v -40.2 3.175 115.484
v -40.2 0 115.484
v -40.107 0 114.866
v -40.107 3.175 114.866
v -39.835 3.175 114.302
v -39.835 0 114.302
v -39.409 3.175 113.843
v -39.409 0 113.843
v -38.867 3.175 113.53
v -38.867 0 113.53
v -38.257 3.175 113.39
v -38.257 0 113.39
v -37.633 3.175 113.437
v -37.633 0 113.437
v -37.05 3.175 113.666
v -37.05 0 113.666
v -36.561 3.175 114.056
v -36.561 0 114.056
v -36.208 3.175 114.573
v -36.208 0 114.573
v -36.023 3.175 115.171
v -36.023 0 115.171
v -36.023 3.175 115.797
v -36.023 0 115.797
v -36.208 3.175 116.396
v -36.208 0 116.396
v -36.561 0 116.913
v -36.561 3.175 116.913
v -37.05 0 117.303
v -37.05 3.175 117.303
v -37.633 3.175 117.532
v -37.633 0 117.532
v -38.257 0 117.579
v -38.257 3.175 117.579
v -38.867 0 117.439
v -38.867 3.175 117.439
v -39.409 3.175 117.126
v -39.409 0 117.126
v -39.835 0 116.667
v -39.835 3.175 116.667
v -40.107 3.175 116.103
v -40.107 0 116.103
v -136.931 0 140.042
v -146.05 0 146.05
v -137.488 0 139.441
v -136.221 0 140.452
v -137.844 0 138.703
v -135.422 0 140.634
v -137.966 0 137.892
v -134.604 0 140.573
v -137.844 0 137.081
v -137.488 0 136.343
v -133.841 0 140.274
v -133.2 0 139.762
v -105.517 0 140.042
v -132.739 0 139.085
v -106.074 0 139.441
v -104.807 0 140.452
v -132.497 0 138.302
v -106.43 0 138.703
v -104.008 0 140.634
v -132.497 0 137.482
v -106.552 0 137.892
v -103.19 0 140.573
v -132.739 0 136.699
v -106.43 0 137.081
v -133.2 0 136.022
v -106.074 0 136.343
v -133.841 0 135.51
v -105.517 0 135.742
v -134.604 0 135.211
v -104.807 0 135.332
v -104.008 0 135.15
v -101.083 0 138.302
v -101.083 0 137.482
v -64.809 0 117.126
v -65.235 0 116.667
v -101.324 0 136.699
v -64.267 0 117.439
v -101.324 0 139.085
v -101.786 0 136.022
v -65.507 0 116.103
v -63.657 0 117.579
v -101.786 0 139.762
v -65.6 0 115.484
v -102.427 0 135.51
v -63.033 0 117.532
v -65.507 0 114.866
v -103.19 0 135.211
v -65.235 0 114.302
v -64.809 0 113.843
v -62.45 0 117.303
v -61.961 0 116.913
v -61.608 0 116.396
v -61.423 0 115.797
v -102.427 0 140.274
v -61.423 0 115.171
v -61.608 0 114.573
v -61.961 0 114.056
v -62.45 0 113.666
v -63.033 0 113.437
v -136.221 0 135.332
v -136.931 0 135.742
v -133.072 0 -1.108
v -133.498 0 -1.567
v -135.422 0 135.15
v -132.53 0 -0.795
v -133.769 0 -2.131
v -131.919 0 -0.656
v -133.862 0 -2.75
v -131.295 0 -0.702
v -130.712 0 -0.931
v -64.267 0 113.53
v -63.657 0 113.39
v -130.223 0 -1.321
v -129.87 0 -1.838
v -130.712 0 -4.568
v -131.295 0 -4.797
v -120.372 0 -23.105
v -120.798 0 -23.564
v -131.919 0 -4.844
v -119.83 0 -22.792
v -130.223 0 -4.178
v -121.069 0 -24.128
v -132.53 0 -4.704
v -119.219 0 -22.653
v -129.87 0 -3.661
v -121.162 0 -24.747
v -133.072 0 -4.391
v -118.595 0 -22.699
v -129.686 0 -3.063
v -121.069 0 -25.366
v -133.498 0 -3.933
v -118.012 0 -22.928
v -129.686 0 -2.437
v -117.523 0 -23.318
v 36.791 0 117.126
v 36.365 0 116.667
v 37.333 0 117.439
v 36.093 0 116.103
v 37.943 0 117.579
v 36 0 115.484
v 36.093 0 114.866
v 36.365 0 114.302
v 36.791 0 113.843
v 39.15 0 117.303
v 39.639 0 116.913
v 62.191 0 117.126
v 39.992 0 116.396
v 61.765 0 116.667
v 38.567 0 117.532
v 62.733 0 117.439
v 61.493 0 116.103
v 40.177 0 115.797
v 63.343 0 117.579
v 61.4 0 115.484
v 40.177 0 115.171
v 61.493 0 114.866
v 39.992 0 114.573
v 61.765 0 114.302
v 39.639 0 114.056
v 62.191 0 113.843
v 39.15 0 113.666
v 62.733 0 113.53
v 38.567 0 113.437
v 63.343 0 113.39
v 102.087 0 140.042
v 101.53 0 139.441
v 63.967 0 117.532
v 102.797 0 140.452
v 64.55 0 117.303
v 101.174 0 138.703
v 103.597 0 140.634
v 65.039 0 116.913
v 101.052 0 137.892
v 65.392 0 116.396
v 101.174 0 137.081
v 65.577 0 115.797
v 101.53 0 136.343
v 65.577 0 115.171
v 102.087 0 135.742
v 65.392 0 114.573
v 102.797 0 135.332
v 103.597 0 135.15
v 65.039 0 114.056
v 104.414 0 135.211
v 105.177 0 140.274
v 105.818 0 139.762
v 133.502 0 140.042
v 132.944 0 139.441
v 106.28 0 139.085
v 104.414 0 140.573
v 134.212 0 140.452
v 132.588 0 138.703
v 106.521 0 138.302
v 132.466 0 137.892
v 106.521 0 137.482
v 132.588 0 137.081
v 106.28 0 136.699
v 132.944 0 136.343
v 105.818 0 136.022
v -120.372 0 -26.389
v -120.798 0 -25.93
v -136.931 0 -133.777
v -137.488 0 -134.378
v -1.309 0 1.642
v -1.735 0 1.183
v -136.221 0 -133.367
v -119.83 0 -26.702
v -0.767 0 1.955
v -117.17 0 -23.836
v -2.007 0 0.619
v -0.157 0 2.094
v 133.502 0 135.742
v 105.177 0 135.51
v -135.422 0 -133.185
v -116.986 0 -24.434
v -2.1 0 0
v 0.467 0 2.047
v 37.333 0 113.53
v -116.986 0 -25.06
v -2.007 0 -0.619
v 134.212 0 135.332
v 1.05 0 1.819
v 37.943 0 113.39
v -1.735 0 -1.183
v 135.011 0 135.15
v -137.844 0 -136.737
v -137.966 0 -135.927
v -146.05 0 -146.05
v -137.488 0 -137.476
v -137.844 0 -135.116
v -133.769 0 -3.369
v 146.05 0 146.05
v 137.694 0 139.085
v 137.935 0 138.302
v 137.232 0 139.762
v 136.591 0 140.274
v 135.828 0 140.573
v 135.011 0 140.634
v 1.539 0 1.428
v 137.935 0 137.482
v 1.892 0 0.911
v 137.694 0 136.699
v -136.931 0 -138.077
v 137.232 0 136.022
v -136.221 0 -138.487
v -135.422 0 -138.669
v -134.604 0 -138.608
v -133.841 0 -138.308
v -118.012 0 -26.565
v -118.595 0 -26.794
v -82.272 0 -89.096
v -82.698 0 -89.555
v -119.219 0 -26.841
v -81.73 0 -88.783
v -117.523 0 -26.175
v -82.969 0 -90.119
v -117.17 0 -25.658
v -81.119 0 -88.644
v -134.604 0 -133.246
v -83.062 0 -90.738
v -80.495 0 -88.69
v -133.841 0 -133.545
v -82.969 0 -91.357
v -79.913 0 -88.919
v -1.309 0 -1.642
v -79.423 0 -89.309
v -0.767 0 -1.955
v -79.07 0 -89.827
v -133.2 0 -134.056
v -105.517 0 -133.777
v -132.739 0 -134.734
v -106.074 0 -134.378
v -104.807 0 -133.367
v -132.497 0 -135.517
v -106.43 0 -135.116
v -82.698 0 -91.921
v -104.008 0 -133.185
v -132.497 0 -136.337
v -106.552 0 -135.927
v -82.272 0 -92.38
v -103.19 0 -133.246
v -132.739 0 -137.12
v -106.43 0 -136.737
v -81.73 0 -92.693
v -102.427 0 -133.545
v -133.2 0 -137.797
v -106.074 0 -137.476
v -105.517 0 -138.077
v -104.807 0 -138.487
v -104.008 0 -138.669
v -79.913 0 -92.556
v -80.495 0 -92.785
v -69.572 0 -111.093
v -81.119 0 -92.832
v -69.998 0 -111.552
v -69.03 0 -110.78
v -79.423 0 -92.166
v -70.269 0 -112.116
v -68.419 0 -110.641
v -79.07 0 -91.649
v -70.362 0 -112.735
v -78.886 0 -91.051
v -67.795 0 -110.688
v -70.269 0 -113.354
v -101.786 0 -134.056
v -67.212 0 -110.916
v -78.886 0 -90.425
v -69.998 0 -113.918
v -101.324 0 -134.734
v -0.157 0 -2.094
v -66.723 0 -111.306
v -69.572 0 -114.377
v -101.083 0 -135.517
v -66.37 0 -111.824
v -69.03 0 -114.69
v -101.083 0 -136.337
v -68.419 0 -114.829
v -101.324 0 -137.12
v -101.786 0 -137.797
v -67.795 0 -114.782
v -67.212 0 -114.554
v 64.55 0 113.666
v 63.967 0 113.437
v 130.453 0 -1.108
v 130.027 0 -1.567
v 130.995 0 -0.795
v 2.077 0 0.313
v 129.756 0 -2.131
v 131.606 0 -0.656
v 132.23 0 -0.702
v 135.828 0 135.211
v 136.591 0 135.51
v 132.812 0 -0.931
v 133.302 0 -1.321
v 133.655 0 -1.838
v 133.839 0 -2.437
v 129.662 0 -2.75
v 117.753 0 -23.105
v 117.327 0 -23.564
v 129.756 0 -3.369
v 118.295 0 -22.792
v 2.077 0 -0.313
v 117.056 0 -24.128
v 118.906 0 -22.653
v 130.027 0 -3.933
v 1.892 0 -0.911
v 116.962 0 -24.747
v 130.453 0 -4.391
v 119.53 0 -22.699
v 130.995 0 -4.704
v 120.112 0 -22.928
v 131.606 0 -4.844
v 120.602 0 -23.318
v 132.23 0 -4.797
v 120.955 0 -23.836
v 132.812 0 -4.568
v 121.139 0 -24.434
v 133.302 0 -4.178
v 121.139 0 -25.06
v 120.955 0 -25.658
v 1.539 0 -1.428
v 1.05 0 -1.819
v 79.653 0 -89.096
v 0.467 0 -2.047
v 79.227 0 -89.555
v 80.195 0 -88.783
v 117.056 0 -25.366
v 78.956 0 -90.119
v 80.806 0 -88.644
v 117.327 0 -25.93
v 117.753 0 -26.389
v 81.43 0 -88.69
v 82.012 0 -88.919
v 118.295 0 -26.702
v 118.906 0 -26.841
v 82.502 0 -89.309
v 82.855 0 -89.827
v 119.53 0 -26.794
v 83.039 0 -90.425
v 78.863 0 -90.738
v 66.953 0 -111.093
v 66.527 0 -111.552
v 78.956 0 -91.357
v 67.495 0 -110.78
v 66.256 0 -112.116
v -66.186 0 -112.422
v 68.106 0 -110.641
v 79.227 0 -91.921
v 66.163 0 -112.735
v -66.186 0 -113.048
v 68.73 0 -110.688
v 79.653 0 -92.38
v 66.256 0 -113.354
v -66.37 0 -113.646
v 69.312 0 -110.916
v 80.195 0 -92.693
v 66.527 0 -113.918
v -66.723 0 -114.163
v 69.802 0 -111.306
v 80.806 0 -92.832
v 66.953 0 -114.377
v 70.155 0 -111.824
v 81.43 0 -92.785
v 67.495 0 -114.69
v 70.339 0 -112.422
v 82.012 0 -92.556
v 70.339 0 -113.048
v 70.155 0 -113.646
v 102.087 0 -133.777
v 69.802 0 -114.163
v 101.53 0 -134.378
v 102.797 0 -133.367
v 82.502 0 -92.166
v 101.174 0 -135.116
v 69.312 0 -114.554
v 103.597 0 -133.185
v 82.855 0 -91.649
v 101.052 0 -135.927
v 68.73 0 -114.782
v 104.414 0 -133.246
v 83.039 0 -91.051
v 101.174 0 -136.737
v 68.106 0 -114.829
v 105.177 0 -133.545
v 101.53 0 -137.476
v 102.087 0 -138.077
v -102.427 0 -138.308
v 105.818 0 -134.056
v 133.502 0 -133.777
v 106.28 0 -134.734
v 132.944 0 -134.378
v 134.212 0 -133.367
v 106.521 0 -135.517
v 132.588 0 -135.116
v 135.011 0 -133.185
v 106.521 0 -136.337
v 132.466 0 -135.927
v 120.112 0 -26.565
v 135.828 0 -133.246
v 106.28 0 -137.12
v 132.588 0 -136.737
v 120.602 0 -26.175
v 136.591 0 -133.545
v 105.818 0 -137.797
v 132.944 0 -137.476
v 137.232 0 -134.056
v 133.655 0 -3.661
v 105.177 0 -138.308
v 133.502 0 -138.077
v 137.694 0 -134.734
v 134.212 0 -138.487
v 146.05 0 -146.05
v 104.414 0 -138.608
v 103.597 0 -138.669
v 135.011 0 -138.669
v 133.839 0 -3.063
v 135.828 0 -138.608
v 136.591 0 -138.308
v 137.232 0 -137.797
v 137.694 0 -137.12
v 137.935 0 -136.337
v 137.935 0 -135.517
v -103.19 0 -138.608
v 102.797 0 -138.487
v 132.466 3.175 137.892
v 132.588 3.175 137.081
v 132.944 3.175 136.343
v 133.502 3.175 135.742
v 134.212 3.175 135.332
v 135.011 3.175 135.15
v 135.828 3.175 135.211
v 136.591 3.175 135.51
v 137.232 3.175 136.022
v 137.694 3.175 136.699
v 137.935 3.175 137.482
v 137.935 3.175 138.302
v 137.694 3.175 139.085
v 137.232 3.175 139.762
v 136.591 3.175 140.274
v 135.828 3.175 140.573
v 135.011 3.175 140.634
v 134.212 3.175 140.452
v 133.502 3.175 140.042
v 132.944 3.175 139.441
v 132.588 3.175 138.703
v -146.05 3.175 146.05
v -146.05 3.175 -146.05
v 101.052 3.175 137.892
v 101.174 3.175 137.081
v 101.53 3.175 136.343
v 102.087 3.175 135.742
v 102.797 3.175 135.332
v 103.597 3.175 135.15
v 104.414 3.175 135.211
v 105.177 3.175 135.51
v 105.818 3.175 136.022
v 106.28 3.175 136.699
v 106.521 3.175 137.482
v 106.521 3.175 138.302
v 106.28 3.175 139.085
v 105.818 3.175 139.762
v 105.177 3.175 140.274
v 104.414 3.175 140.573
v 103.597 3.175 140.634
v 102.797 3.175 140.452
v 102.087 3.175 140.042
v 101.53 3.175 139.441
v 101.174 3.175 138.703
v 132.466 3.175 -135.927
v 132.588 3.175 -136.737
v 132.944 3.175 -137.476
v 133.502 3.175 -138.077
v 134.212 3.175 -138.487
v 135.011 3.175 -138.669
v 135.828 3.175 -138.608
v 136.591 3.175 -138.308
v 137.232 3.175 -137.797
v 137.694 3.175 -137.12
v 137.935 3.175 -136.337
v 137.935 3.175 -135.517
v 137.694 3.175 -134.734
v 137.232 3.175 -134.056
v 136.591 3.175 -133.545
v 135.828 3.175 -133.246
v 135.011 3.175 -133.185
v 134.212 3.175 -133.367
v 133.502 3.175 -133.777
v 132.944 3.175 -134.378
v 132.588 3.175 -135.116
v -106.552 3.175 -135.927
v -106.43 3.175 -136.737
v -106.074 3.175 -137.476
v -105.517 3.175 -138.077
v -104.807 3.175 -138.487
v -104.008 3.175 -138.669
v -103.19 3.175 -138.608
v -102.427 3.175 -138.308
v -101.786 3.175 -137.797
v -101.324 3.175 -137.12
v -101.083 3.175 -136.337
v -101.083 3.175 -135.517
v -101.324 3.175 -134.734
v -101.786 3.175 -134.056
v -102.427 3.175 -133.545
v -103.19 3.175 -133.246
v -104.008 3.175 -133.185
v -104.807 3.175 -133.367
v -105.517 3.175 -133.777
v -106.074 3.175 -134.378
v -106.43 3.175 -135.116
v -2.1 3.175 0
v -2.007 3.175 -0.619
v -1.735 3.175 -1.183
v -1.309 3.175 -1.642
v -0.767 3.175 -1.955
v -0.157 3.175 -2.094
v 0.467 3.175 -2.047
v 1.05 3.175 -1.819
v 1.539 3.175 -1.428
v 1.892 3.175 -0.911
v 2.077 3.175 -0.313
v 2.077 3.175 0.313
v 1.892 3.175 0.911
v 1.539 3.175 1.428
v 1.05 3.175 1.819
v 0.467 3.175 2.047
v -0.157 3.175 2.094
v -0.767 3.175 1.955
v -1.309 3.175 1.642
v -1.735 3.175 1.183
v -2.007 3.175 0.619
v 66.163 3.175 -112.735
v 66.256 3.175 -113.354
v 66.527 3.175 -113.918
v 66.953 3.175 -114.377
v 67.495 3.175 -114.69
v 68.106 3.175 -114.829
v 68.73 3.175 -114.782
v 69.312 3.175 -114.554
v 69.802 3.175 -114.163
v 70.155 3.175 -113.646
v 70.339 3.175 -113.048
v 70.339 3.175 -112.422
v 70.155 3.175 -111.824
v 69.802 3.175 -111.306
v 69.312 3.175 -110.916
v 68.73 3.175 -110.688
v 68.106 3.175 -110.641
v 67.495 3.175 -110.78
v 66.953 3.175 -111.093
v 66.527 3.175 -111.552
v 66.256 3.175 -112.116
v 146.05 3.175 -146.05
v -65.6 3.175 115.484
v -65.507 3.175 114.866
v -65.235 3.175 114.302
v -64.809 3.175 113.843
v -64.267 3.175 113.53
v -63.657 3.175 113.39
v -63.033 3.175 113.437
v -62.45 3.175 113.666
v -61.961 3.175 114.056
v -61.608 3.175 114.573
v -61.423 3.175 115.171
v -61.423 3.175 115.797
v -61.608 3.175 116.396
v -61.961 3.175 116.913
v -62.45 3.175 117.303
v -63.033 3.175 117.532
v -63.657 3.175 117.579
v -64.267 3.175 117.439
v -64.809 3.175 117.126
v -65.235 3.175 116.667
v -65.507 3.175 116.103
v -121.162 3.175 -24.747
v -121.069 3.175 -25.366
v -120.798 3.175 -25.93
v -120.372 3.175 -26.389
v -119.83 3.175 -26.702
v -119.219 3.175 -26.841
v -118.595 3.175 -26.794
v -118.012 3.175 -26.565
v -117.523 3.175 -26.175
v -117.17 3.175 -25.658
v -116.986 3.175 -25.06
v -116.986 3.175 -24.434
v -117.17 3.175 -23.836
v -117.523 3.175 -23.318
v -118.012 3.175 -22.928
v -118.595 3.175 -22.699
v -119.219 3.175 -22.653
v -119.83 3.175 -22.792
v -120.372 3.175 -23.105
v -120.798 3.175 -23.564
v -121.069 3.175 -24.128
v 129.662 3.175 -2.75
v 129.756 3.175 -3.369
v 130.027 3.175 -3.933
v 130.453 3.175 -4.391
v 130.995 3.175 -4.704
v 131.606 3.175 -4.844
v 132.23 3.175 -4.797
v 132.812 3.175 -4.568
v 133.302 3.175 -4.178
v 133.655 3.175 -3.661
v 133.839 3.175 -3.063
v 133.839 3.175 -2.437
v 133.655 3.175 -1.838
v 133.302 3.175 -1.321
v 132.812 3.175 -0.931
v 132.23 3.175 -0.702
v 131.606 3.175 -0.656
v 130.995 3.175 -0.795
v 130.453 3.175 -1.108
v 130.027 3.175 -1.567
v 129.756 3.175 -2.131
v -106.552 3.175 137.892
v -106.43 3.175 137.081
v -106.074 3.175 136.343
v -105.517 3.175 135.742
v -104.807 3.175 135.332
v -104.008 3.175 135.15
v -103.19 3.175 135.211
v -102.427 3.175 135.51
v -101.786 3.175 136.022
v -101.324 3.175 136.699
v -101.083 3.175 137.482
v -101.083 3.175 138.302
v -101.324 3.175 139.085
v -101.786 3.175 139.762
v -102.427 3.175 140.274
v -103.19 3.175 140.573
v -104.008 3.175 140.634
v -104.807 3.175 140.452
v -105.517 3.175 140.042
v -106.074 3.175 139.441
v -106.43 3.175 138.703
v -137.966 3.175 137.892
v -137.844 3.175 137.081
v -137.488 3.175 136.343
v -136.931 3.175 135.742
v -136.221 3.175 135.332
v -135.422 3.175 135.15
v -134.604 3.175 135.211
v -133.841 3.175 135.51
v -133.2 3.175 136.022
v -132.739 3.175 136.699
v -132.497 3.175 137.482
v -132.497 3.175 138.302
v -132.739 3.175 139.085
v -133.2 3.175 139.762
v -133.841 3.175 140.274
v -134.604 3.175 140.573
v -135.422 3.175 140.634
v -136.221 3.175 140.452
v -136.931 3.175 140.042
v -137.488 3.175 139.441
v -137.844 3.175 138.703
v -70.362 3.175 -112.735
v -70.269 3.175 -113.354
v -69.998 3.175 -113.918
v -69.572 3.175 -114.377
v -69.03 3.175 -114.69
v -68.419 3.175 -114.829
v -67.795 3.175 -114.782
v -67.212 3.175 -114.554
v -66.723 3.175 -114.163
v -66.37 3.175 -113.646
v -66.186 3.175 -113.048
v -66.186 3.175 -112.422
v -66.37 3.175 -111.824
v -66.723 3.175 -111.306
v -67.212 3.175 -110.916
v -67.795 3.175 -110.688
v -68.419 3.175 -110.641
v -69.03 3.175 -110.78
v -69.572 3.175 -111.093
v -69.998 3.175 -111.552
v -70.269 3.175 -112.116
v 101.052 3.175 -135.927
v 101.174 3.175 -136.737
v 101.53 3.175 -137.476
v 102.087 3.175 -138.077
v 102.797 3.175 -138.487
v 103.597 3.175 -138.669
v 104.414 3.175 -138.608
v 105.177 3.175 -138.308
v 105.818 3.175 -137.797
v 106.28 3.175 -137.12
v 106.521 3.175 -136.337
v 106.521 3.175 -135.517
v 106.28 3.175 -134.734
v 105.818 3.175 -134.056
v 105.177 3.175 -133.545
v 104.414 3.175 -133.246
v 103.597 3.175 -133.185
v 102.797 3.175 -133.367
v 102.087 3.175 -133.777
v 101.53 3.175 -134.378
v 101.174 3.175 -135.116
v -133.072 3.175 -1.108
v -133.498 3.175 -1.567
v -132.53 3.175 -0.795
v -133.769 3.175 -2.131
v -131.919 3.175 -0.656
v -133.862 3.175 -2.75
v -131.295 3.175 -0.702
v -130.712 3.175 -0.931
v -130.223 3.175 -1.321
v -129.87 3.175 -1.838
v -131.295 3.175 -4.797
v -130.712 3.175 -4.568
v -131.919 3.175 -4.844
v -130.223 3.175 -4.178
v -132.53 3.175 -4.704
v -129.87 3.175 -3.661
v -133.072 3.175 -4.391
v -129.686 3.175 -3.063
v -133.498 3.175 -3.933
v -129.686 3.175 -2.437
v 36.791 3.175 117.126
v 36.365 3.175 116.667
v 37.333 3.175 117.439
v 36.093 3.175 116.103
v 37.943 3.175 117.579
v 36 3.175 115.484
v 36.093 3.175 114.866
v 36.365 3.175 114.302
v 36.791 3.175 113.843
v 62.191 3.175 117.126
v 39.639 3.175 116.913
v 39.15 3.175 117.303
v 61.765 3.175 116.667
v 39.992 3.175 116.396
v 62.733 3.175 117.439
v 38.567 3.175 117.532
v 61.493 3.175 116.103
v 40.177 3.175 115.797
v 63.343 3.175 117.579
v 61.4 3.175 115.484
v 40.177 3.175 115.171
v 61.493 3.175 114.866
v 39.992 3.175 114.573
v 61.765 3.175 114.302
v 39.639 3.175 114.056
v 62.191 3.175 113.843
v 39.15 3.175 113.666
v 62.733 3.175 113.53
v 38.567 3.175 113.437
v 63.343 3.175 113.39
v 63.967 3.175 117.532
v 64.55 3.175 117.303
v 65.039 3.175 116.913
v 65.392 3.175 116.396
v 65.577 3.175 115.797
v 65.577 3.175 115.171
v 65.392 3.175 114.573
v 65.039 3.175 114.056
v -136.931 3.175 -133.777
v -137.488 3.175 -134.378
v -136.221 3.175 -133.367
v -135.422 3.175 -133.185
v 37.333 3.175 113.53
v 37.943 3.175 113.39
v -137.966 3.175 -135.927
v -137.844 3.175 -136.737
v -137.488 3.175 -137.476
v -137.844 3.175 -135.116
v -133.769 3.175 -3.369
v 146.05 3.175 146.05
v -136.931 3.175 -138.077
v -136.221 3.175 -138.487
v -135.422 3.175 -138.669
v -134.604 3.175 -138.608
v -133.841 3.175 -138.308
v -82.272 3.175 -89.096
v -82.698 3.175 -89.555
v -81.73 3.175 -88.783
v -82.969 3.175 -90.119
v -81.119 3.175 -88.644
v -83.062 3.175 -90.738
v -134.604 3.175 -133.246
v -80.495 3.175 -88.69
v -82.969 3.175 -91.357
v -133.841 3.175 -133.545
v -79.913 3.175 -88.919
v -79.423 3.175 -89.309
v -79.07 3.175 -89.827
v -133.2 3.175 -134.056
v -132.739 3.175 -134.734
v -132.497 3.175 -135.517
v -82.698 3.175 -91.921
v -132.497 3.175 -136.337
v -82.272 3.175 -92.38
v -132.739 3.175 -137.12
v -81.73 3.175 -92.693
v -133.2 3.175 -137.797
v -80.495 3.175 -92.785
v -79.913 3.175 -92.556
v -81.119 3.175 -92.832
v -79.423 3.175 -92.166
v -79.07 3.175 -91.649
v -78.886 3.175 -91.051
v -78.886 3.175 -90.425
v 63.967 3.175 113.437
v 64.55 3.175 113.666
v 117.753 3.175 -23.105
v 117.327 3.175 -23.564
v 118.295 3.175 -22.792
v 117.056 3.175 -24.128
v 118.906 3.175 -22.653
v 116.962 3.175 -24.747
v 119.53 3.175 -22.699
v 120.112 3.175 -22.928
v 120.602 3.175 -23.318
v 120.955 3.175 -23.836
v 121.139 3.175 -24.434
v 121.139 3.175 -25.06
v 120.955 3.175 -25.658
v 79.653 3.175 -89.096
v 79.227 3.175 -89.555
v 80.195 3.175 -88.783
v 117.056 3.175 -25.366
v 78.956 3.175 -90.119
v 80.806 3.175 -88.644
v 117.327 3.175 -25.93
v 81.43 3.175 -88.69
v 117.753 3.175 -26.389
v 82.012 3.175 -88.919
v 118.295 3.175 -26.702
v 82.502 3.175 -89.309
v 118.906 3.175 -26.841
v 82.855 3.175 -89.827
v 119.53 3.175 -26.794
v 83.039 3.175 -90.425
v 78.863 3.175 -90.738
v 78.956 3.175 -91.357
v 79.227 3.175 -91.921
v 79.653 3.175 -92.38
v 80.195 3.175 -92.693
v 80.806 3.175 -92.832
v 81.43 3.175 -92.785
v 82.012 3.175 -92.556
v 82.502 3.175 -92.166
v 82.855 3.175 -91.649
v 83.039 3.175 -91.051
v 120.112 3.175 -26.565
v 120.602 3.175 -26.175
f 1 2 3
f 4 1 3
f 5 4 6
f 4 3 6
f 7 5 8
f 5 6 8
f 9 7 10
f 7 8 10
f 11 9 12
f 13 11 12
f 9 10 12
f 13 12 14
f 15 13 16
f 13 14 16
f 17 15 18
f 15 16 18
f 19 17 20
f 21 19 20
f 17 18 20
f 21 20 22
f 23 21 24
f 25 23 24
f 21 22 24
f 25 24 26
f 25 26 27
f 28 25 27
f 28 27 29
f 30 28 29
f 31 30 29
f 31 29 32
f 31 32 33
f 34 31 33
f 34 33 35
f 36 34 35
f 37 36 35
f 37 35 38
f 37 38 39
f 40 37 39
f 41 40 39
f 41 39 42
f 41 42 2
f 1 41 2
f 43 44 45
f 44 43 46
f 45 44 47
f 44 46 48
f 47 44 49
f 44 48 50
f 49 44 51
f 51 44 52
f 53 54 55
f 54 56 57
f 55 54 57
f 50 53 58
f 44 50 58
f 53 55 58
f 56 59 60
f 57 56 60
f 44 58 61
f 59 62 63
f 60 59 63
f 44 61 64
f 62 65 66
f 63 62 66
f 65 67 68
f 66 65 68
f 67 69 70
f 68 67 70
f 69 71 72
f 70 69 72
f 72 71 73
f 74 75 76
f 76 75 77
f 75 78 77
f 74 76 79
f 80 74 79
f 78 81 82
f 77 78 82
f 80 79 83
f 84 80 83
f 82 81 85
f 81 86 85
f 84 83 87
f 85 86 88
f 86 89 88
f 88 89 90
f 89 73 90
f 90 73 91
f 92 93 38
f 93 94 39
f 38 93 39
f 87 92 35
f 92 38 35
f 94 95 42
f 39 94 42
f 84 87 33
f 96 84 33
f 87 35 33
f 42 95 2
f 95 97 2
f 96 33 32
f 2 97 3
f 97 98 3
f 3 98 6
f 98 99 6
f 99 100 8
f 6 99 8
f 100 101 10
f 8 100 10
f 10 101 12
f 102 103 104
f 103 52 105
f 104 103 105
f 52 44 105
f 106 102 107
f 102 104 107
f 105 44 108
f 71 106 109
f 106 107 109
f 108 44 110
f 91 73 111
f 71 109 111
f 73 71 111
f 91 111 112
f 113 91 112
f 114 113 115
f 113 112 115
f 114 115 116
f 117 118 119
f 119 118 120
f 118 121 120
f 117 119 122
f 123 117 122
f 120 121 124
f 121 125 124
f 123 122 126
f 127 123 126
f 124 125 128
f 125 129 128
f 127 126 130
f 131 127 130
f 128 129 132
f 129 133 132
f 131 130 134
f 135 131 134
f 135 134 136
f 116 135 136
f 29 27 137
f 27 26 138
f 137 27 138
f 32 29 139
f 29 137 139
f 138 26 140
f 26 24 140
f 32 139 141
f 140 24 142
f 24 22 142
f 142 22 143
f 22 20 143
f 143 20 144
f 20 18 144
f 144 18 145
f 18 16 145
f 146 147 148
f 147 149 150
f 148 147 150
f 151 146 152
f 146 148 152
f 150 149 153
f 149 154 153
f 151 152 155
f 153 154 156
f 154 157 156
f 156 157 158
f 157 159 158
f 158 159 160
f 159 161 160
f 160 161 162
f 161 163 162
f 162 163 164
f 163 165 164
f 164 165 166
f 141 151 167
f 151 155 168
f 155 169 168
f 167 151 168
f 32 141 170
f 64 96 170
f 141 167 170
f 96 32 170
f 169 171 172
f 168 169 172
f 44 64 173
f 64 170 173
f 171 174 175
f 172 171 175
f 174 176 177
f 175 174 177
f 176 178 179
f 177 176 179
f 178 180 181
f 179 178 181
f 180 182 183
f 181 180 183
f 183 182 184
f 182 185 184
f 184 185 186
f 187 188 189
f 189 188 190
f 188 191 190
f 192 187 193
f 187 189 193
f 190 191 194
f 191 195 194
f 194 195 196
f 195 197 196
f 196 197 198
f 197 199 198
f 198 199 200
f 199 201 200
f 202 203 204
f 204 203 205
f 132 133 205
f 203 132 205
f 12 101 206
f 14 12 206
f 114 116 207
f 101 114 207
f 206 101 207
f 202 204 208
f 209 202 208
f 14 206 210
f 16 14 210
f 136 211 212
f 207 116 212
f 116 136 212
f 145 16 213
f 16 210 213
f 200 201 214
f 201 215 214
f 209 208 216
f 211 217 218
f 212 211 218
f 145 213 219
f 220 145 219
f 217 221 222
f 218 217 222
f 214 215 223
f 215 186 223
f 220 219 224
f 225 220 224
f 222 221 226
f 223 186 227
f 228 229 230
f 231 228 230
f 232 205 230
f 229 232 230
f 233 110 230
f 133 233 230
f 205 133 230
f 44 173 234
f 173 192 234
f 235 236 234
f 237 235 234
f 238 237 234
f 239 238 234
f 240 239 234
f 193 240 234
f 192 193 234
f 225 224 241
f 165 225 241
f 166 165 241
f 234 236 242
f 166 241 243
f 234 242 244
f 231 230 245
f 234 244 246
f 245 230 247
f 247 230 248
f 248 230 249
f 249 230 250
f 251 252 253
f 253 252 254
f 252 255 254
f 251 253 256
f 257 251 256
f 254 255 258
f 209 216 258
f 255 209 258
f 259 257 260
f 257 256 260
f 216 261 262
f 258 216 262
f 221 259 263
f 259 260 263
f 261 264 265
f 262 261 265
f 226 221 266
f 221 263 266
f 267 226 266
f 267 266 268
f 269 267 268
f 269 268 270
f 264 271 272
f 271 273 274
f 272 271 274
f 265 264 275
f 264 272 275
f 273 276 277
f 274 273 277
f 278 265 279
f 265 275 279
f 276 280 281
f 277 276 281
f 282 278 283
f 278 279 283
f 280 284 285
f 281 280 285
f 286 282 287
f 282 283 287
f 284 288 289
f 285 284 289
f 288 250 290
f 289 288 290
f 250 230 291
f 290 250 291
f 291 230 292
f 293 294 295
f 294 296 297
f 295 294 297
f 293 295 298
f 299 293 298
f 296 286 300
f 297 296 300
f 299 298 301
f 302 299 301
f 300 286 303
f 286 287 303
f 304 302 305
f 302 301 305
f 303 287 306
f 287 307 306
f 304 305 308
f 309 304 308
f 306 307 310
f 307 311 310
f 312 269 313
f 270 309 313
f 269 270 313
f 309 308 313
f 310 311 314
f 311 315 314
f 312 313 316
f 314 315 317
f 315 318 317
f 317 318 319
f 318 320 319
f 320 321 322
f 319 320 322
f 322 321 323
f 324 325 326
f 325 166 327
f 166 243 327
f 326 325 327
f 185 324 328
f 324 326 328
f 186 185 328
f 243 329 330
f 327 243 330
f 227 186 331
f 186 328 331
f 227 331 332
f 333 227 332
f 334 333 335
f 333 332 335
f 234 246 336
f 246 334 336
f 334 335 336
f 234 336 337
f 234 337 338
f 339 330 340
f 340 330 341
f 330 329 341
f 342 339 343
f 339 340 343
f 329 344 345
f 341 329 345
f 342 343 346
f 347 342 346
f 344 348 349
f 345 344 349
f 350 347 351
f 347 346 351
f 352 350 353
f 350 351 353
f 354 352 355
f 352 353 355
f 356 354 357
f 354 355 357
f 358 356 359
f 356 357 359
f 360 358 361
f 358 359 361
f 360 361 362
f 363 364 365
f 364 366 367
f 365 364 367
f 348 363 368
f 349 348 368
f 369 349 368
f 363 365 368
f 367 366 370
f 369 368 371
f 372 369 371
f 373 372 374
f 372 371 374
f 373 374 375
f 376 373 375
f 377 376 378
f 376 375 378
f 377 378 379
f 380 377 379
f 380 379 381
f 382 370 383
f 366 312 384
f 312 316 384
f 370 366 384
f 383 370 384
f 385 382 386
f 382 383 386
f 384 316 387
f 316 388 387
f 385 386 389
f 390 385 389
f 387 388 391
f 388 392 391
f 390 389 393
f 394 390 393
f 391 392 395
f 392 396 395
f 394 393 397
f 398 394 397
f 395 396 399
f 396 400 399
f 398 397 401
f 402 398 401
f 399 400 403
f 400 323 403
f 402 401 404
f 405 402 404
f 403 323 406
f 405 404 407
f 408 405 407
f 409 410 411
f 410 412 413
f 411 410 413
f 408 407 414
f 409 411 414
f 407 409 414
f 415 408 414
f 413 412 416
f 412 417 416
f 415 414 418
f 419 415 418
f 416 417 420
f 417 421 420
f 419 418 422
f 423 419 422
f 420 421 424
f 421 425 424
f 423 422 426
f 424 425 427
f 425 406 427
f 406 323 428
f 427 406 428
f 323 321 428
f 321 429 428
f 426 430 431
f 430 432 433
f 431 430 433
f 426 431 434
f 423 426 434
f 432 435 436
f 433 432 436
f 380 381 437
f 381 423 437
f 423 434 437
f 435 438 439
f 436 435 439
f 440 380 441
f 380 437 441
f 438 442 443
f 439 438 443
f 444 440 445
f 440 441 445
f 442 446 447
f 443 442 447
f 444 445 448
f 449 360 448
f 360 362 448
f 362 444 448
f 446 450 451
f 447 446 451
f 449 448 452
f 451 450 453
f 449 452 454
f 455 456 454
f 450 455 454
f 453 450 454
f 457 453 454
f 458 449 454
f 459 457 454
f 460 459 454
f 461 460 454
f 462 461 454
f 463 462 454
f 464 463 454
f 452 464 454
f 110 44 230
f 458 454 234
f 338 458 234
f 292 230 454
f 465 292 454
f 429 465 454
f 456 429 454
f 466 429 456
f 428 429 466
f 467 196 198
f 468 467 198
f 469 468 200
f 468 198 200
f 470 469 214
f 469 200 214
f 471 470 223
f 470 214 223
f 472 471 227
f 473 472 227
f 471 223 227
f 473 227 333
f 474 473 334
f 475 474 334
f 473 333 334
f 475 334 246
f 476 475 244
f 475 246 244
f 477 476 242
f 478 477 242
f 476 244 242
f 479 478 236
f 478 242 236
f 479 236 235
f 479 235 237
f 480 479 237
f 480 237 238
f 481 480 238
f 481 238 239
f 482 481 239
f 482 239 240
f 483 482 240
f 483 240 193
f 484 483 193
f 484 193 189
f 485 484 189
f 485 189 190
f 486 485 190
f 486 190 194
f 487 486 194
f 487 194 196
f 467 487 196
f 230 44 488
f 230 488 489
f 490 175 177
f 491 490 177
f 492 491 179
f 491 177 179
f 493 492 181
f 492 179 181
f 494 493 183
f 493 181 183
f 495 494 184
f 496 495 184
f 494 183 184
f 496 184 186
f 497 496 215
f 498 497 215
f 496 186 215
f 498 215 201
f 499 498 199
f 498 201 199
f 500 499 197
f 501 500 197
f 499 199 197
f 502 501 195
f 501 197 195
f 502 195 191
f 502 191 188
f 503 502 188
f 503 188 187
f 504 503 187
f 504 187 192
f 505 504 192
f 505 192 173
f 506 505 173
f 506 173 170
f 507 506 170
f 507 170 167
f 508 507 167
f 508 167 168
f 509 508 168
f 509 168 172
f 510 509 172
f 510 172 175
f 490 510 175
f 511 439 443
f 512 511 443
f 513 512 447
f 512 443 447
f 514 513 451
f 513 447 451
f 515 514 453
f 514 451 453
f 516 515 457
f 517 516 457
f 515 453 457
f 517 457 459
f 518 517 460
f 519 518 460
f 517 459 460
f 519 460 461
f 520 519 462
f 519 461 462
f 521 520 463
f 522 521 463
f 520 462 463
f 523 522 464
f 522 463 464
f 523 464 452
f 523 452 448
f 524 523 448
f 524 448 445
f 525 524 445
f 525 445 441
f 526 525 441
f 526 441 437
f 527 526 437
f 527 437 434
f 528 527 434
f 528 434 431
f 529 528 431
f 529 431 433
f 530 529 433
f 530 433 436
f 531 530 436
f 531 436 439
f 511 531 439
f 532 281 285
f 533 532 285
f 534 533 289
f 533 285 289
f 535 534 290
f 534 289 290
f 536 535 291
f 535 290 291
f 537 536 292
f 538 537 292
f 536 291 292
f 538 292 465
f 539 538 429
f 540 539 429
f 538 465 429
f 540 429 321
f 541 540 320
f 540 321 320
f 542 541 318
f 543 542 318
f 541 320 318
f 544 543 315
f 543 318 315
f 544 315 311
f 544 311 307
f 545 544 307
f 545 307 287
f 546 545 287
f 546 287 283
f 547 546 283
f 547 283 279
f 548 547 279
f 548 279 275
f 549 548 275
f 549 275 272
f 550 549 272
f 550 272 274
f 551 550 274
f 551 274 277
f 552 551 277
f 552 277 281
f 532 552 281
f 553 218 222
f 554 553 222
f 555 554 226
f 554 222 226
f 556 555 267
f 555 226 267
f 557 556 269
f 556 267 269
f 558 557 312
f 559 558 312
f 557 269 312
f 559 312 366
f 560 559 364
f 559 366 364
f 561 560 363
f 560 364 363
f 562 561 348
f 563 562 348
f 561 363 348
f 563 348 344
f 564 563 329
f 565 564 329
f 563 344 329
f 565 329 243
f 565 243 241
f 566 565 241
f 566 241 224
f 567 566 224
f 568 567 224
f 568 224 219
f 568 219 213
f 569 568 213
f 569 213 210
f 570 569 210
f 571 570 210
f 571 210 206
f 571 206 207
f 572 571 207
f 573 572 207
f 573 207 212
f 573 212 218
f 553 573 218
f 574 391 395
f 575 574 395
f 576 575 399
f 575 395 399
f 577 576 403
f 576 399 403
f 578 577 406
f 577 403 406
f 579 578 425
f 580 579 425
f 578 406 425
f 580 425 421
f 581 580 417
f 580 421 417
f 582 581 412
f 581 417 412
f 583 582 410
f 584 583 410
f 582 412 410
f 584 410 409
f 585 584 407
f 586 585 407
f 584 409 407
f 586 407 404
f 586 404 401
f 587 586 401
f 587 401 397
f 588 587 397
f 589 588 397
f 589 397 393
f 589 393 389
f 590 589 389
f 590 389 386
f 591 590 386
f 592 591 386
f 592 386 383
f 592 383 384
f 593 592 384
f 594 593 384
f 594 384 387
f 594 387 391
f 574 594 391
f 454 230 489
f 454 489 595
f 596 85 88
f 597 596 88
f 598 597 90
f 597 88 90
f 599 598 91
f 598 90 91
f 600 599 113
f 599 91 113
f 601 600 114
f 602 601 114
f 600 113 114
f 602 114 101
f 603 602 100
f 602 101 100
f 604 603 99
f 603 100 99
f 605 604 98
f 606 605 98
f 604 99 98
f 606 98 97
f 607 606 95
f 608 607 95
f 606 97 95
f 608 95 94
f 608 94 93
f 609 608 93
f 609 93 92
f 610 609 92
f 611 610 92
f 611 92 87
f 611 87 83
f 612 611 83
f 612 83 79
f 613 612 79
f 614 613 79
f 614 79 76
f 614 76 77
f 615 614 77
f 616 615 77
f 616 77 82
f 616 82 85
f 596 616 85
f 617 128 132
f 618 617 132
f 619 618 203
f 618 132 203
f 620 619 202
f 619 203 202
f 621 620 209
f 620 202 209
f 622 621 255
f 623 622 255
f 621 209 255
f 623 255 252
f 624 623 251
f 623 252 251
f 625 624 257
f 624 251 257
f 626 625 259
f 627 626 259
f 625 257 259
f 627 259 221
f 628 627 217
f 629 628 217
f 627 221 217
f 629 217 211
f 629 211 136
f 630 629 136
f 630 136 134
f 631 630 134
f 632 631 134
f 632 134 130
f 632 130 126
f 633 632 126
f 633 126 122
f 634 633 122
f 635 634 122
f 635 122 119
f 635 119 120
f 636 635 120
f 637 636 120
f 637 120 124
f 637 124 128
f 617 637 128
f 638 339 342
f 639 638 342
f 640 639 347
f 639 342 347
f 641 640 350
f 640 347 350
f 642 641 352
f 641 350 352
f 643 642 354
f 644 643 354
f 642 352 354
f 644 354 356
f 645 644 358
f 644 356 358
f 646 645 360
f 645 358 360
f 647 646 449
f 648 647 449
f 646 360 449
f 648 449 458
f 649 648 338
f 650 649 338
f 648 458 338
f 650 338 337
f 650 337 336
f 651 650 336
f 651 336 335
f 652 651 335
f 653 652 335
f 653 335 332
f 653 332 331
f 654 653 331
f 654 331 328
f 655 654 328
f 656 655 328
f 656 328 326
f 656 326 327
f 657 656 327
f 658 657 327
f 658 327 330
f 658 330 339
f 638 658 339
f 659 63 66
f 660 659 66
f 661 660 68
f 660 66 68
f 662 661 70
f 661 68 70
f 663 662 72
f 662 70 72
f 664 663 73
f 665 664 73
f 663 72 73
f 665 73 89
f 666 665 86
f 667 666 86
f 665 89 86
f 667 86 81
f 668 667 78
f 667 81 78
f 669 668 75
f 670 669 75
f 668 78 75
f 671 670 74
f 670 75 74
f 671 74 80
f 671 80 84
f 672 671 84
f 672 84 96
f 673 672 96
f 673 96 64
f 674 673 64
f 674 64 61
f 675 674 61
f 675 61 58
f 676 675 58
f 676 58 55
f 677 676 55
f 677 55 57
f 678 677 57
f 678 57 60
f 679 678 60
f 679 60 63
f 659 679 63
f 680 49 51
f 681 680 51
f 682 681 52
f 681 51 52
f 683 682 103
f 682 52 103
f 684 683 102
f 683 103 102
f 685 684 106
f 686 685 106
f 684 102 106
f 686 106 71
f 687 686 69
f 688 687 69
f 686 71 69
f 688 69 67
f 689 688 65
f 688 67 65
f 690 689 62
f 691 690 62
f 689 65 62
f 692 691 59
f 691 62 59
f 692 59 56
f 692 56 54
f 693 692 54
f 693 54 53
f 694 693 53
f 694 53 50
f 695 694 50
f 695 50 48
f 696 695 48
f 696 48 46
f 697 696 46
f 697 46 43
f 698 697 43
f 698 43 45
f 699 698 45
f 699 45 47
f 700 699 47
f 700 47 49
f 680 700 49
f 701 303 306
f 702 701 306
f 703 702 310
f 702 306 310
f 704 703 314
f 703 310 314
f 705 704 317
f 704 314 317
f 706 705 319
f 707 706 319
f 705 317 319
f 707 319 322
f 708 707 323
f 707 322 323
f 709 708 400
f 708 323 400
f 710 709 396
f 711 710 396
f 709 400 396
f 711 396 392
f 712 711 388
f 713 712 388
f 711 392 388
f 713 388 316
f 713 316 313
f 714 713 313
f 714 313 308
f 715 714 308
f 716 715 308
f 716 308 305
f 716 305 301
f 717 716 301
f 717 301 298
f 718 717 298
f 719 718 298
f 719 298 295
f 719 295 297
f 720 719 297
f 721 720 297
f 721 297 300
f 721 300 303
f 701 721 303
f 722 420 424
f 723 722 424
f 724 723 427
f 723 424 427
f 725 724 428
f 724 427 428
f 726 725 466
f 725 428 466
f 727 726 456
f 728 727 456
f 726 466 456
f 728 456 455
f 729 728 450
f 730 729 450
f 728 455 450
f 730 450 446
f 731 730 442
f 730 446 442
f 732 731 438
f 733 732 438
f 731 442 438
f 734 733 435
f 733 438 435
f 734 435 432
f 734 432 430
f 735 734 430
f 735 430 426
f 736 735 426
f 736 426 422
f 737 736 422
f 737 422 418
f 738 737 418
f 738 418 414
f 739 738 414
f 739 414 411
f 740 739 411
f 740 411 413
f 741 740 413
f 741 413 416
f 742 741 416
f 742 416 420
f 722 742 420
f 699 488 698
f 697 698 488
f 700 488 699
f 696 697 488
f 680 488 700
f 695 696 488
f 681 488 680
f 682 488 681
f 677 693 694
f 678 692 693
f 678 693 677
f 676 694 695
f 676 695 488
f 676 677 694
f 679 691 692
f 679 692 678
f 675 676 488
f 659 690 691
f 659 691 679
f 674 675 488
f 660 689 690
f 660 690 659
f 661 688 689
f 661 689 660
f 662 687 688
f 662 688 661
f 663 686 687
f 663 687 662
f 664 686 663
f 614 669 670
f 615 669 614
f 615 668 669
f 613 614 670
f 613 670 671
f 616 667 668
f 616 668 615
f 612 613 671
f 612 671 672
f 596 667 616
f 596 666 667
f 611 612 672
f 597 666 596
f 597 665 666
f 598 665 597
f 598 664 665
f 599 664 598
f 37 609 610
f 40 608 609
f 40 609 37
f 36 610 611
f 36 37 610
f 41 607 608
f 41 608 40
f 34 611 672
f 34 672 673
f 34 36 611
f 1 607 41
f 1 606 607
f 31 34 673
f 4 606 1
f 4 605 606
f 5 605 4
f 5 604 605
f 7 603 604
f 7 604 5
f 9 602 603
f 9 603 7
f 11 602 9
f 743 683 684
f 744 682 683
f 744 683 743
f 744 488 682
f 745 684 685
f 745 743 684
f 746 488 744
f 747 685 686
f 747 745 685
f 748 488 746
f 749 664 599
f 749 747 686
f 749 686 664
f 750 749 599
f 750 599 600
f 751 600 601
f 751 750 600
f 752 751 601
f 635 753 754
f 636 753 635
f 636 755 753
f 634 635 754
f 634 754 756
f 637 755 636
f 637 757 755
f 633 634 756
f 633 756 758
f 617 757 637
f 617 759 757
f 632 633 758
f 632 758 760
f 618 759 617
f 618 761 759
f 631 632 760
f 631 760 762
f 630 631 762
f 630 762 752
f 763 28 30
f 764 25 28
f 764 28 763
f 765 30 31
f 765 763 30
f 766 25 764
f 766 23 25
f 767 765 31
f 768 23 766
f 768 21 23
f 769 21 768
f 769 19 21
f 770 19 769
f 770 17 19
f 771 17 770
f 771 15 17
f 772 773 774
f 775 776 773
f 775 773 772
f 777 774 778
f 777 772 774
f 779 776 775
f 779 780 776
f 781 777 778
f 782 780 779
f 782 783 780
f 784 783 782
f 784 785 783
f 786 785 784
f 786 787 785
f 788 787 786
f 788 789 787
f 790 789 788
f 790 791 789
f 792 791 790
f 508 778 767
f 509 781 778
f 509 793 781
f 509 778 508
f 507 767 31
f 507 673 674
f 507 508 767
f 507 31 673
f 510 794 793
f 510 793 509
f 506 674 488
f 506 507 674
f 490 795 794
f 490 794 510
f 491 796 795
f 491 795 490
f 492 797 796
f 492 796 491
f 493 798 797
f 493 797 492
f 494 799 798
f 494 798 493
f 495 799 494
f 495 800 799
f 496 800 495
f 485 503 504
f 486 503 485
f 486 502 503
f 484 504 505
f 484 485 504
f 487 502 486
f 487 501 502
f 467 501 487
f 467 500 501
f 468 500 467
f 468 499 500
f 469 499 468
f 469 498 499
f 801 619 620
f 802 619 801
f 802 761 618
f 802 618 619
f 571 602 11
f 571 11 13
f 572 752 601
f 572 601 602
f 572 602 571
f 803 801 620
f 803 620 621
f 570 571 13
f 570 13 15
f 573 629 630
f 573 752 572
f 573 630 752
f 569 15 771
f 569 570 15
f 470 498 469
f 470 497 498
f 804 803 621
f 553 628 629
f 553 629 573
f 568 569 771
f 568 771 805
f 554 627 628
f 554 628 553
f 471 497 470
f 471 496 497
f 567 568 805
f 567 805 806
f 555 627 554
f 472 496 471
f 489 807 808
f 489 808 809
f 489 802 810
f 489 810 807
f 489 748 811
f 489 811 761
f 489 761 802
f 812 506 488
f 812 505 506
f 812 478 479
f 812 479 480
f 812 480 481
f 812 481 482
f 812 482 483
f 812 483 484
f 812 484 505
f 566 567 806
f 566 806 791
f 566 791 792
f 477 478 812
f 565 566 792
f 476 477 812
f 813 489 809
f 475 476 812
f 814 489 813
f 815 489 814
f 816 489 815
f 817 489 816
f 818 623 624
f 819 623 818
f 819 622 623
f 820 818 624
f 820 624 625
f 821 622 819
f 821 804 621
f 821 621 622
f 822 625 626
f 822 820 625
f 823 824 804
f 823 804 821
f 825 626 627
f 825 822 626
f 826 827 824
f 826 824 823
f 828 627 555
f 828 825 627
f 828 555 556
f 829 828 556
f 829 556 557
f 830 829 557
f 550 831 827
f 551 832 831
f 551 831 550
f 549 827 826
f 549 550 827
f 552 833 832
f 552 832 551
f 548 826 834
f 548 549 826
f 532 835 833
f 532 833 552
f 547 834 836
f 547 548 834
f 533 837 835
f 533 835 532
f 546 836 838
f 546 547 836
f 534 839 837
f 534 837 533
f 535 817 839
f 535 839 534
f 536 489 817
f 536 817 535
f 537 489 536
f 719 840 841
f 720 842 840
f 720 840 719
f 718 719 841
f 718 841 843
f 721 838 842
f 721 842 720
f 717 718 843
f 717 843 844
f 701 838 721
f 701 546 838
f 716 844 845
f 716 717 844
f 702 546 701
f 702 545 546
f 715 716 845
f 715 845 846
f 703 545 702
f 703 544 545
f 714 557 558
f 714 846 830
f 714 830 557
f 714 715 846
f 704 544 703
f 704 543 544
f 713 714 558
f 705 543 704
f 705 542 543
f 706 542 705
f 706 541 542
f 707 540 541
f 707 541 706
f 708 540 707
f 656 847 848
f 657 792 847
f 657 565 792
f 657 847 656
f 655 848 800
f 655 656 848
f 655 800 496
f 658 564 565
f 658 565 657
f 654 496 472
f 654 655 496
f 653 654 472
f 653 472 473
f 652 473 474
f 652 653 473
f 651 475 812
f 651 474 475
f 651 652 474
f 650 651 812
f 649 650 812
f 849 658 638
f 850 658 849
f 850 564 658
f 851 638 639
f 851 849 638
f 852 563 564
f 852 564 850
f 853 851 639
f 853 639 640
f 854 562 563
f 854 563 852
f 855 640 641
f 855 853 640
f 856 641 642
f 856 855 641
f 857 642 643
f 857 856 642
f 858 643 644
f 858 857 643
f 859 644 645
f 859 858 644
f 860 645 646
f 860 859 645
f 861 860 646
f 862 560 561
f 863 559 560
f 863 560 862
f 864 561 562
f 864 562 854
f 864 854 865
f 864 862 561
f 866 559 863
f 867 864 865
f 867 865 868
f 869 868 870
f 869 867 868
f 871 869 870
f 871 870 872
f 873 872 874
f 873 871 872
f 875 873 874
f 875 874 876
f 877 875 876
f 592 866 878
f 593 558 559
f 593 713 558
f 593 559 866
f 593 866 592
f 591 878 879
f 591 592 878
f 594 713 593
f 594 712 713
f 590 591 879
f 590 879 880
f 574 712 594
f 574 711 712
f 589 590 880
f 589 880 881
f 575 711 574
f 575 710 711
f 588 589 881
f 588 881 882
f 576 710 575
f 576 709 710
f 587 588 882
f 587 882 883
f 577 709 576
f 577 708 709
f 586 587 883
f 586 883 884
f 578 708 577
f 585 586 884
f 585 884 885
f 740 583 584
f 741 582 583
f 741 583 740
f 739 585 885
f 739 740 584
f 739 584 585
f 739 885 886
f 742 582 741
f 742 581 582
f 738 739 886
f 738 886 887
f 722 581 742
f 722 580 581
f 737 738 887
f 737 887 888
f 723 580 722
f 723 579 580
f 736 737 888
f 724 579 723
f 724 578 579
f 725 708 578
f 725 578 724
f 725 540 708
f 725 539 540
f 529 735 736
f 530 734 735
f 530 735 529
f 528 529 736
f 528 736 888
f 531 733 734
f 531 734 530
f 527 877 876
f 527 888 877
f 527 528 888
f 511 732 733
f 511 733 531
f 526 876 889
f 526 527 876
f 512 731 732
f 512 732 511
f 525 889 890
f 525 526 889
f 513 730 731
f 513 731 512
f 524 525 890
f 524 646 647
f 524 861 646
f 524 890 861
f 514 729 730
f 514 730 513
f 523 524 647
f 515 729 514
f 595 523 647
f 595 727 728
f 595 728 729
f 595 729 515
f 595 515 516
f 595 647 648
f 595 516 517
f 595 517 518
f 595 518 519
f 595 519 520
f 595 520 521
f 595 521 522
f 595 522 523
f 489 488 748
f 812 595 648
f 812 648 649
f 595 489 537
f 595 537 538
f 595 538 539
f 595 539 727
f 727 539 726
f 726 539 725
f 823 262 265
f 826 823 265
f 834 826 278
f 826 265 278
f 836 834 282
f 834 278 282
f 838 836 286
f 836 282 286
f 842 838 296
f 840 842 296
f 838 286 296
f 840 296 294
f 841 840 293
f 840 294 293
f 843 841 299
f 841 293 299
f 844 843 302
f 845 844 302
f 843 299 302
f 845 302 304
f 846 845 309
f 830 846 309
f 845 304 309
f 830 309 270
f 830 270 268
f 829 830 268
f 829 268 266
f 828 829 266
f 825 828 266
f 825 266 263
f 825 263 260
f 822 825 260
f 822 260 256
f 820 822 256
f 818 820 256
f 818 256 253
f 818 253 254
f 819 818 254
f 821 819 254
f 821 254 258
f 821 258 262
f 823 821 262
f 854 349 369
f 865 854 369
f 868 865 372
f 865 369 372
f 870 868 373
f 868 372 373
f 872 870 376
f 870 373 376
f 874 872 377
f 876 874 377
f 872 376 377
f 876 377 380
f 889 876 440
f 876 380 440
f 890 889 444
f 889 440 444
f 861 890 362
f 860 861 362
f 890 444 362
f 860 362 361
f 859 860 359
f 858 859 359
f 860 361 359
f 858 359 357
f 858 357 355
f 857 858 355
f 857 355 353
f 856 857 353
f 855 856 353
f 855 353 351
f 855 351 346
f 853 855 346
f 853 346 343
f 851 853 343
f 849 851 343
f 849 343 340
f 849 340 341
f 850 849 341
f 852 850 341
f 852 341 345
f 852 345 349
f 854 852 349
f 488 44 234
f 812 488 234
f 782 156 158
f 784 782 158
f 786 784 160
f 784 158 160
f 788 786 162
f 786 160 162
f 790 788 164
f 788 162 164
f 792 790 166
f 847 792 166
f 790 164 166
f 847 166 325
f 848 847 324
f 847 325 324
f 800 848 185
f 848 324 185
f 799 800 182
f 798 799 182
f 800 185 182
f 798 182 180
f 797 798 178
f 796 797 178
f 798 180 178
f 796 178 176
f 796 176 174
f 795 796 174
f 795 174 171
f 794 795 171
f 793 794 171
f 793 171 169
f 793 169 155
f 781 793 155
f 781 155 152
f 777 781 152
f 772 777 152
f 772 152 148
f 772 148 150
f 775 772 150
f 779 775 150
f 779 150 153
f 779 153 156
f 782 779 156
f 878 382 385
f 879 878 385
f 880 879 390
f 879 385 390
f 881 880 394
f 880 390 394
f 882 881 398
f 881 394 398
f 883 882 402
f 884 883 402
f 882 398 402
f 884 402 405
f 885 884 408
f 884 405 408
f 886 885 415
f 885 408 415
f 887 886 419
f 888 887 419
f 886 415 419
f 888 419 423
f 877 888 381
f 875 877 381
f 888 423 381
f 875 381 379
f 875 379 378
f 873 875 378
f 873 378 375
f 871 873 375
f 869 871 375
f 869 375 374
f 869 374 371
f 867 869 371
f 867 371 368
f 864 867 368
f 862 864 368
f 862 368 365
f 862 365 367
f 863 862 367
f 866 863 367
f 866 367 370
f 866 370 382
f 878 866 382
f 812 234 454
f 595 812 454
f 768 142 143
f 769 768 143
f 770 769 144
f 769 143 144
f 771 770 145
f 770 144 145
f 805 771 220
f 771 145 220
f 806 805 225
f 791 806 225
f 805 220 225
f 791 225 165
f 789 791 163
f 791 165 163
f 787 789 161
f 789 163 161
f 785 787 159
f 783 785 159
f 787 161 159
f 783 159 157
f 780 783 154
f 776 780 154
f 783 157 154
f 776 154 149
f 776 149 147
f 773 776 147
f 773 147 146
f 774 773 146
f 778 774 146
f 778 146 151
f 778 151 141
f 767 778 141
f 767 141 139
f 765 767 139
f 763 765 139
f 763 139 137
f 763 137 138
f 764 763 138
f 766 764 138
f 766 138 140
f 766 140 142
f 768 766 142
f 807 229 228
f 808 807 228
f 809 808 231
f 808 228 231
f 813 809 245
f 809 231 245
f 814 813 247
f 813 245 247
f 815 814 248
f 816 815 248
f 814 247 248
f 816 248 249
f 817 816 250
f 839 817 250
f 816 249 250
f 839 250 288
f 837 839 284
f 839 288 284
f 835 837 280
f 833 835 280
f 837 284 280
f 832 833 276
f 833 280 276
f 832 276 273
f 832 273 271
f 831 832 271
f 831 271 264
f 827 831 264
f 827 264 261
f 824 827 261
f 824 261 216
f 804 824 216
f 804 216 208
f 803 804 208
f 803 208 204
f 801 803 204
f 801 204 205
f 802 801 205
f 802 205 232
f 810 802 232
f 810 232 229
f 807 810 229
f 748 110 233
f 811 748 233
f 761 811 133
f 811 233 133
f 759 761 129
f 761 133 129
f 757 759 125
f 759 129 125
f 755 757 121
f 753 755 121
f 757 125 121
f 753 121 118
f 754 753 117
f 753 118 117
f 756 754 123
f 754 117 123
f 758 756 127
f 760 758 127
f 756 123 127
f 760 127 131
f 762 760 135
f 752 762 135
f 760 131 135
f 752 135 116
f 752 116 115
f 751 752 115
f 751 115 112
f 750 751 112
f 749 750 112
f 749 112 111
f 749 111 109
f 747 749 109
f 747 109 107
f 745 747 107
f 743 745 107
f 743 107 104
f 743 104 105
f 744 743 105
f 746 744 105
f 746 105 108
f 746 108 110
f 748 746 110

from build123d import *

# Parameters (mm, degrees)
SKETCH1_W                = 292.1
SKETCH1_H                = 292.1
BOSS_EXTRUDE1_DEPTH      = 3.175
M5X0_8_TAPPED_HOLE2_D    = 4.2
M5_CLEARANCE_HOLE1_D     = 5.5
M5_CLEARANCE_HOLE1_DEPTH = 25.4
M5_CLEARANCE_HOLE1_TIP   = 1.652366702


with BuildPart() as part:
    # Sketch1 → Boss-Extrude1 (new body)
    with BuildSketch(Plane(origin=(0, 0, 0), x_dir=(1, 0, 0), z_dir=(0, 1, 0))):
        Rectangle(SKETCH1_W, SKETCH1_H)
    extrude(amount=BOSS_EXTRUDE1_DEPTH)

    # M5x0.8 Tapped Hole2 (through all)
    with Locations(Plane(origin=(0, 3.175, 0), x_dir=(1, 0, 0), z_dir=(0, 1, 0))):
        with Locations((-63.5, -115.484487595), (-38.1, -115.484487595), (38.1, -115.484487595), (63.5, -115.484487595), (-68.2625, 112.734856938), (-80.9625, 90.737811682), (-119.0625, 24.746675913), (-131.7625, 2.749630657), (131.7625, 2.749630657), (119.0625, 24.746675913), (80.9625, 90.737811682), (68.2625, 112.734856938), (0, 0)):
            Hole(M5X0_8_TAPPED_HOLE2_D / 2)

    # M5 Clearance Hole1
    with Locations(Plane(origin=(0, 3.175, 0), x_dir=(1, 0, 0), z_dir=(0, 1, 0))):
        with Locations((-135.216191685, -137.892013655), (-103.802039507, -137.892013655), (103.802039507, -137.892013655), (135.216191685, -137.892013655), (103.802039507, 135.926865034), (135.216191685, 135.926865034), (-135.216191685, 135.926865034), (-103.802039507, 135.926865034)):
            Hole(M5_CLEARANCE_HOLE1_D / 2, depth=M5_CLEARANCE_HOLE1_DEPTH)
            with Locations((0, 0, -(M5_CLEARANCE_HOLE1_DEPTH + M5_CLEARANCE_HOLE1_TIP / 2))):  # 118° drill point
                Cone(0, M5_CLEARANCE_HOLE1_D / 2, M5_CLEARANCE_HOLE1_TIP, mode=Mode.SUBTRACT)


solid = part.part
